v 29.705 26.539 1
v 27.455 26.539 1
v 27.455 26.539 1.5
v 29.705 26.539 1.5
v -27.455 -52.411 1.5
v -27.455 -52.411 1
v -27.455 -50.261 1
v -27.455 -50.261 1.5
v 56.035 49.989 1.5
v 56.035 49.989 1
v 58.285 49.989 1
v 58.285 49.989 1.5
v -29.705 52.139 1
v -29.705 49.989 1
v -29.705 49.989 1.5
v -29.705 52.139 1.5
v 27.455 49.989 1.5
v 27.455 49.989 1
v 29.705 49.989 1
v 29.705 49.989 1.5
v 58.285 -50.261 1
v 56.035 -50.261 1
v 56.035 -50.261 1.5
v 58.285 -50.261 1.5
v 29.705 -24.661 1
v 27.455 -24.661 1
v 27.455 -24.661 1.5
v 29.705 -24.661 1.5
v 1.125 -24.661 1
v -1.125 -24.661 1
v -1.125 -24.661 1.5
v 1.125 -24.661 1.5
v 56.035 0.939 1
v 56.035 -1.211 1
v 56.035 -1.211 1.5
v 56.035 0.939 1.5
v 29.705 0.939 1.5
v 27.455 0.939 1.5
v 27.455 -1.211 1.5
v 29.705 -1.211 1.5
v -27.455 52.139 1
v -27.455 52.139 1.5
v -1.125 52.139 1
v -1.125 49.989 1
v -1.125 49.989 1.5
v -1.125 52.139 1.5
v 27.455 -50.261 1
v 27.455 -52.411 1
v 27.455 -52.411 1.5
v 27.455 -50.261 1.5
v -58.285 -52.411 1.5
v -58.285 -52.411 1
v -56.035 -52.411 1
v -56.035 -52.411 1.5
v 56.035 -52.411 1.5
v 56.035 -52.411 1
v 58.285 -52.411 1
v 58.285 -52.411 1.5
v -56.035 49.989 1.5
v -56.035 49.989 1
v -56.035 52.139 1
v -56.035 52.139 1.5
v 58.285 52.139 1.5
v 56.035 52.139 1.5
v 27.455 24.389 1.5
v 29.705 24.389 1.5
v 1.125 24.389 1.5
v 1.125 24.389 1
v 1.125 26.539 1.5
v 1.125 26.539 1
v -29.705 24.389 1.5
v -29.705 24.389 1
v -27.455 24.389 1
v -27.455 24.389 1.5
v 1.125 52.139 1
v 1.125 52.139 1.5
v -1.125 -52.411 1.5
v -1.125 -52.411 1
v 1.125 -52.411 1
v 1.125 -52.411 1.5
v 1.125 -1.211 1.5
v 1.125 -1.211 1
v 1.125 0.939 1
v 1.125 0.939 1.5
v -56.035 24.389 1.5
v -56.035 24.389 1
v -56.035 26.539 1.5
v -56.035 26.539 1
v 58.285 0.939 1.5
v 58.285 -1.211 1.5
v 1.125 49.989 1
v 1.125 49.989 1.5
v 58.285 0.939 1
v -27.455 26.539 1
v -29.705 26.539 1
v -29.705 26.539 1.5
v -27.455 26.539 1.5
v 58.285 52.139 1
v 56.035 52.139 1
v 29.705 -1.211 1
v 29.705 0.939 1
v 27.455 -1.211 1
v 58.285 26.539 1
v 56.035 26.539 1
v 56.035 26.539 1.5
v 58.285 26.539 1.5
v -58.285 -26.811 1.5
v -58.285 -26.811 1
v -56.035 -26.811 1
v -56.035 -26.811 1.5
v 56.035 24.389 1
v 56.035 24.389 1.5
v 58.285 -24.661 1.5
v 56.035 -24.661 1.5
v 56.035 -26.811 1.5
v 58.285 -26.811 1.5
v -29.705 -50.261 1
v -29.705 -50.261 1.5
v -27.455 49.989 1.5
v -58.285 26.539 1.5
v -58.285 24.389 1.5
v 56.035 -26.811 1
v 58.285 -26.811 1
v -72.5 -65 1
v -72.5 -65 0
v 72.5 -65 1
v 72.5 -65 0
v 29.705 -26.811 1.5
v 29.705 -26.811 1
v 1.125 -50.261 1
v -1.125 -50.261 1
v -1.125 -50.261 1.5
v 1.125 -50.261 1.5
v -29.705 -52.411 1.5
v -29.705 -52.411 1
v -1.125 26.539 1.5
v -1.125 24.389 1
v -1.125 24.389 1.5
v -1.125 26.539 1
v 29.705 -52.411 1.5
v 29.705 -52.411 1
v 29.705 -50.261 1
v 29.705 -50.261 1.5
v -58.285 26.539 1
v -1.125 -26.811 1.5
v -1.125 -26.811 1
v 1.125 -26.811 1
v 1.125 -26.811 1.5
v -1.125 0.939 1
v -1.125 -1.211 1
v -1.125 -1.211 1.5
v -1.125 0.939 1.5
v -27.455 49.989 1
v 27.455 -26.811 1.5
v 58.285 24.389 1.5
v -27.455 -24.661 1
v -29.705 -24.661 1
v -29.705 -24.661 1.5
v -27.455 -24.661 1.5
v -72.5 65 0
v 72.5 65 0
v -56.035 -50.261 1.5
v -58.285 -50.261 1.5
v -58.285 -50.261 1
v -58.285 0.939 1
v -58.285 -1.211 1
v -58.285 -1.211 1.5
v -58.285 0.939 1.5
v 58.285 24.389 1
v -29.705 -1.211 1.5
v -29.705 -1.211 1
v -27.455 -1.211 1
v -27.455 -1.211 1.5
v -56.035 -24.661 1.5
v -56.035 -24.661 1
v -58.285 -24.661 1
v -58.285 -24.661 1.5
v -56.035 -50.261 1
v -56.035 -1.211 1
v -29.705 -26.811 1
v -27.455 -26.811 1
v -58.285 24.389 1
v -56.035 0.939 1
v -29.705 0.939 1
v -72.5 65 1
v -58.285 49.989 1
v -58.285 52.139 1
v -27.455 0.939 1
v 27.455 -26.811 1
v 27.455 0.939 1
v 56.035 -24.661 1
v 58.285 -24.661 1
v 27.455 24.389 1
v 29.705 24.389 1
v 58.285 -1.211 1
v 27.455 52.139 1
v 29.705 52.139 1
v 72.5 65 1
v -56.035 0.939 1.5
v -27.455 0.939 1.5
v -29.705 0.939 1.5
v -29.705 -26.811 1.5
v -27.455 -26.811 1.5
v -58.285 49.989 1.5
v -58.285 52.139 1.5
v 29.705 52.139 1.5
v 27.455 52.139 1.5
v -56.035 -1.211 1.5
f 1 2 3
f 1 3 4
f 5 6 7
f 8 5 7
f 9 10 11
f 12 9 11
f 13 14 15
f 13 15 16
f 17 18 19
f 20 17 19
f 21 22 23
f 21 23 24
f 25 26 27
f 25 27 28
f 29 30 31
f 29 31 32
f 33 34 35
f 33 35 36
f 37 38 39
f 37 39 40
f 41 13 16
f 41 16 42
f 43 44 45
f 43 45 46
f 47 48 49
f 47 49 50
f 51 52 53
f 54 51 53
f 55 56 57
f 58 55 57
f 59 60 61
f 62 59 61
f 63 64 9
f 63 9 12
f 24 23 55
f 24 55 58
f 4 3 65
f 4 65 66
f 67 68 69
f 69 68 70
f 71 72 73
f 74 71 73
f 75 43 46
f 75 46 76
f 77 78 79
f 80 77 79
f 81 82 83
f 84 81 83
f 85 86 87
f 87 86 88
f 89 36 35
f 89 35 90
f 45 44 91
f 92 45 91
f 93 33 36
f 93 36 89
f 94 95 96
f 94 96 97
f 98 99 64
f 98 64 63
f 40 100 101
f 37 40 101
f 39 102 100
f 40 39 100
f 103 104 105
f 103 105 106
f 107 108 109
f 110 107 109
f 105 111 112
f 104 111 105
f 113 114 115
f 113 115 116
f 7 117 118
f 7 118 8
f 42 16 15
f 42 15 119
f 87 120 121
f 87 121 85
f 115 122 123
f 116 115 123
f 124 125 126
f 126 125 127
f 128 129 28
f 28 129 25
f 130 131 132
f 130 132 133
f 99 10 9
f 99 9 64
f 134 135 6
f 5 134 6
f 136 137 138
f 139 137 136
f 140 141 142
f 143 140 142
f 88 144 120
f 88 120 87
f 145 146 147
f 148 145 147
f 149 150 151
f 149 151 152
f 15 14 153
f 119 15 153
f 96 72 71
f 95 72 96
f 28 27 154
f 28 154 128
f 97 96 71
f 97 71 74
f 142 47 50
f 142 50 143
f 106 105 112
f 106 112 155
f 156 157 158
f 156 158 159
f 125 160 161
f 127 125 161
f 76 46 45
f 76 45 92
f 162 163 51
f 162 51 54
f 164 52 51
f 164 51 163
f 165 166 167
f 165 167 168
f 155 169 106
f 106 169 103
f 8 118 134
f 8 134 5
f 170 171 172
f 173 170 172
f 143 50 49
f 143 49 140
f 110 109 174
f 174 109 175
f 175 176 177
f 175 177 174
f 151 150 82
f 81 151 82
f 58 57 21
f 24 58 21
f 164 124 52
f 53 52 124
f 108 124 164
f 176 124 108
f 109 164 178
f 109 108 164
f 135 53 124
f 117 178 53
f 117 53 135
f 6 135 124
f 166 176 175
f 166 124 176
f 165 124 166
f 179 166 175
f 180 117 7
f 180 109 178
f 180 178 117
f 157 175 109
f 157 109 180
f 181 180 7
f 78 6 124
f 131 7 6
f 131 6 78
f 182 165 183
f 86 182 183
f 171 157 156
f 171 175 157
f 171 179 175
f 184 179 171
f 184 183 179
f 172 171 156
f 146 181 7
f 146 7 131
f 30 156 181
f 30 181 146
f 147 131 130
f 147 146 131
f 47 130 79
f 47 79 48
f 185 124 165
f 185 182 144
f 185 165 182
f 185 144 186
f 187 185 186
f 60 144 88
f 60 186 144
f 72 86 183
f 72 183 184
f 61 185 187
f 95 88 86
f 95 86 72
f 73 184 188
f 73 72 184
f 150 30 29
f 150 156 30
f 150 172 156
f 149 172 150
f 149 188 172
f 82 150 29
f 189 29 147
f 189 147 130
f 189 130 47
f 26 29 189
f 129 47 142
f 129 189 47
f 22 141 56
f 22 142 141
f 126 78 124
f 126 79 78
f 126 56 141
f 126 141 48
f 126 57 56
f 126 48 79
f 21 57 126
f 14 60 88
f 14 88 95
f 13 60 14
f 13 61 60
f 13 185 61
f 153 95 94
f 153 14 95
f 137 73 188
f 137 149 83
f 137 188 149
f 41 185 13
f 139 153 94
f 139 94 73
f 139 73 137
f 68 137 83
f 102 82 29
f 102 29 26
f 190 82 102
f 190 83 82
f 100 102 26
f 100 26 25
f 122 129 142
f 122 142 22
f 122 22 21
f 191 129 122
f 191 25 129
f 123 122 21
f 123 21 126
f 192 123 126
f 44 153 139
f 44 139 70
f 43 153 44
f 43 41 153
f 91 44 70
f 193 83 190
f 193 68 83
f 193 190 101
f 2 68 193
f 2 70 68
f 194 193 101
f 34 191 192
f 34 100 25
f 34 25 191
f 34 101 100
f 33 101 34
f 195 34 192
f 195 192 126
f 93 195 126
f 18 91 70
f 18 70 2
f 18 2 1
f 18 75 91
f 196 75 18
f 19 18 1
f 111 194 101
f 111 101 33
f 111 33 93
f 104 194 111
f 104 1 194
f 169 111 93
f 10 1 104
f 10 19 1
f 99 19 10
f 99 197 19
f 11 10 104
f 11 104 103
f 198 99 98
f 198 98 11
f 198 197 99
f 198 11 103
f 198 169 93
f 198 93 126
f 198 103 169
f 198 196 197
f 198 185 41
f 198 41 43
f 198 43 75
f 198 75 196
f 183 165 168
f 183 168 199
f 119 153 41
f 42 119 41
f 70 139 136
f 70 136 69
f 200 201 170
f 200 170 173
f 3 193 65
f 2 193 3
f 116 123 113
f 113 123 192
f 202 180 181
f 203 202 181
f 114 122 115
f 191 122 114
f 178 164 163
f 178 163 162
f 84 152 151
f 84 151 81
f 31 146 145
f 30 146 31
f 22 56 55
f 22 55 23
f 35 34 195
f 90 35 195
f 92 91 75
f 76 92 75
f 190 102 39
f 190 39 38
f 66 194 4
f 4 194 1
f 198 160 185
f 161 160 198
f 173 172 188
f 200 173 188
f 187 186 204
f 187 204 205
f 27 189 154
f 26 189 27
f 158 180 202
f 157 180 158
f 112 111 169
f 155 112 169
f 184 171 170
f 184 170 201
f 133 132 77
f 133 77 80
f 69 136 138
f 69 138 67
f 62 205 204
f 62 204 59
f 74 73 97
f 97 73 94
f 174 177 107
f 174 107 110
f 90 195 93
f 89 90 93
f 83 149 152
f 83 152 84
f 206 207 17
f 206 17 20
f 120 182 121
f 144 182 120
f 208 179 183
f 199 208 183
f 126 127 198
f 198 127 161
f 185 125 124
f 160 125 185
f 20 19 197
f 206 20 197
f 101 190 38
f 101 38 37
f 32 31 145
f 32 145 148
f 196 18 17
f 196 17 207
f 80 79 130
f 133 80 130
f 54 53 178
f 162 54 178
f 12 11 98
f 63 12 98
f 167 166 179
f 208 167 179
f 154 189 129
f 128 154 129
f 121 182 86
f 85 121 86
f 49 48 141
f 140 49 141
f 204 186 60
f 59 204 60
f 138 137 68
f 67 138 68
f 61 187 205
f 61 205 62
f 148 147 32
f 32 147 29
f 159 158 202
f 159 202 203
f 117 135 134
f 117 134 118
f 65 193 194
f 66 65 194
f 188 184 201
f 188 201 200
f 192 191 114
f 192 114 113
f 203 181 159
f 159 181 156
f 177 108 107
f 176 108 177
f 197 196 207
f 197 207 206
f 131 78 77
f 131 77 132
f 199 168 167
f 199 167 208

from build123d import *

# Parameters (mm, degrees)
SKETCH_1_W      = 145
SKETCH_1_H      = 130
EXTRUDE_1_DEPTH = 1
SKETCH_2_W      = 2.25
SKETCH_2_H      = 2.15
EXTRUDE_2_DEPTH = 0.5


with BuildPart() as part:
    # 草图1 → 凸台-拉伸1 (new body)
    with BuildSketch(Plane.XY):
        Rectangle(SKETCH_1_W, SKETCH_1_H)
    extrude(amount=EXTRUDE_1_DEPTH)

    # 草图2 → 凸台-拉伸2 (add)
    with BuildSketch(Plane.XY.offset(1)):
        with Locations((-28.58, 51.063510548)):
            Rectangle(SKETCH_2_W, SKETCH_2_H)
        with Locations((-57.16, 51.063510548)):
            Rectangle(SKETCH_2_W, SKETCH_2_H)
        with Locations((0, 51.063510548)):
            Rectangle(SKETCH_2_W, SKETCH_2_H)
        with Locations((28.58, 51.063510548)):
            Rectangle(SKETCH_2_W, SKETCH_2_H)
        with Locations((57.16, 51.063510548)):
            Rectangle(SKETCH_2_W, SKETCH_2_H)
        with Locations((-28.58, 25.463510548)):
            Rectangle(SKETCH_2_W, SKETCH_2_H)
        with Locations((0, 25.463510548)):
            Rectangle(SKETCH_2_W, SKETCH_2_H)
        with Locations((28.58, 25.463510548)):
            Rectangle(SKETCH_2_W, SKETCH_2_H)
        with Locations((57.16, 25.463510548)):
            Rectangle(SKETCH_2_W, SKETCH_2_H)
        with Locations((-28.58, -0.136489452)):
            Rectangle(SKETCH_2_W, SKETCH_2_H)
        with Locations((0, -0.136489452)):
            Rectangle(SKETCH_2_W, SKETCH_2_H)
        with Locations((28.58, -0.136489452)):
            Rectangle(SKETCH_2_W, SKETCH_2_H)
        with Locations((57.16, -0.136489452)):
            Rectangle(SKETCH_2_W, SKETCH_2_H)
        with Locations((-28.58, -25.736489452)):
            Rectangle(SKETCH_2_W, SKETCH_2_H)
        with Locations((0, -25.736489452)):
            Rectangle(SKETCH_2_W, SKETCH_2_H)
        with Locations((28.58, -25.736489452)):
            Rectangle(SKETCH_2_W, SKETCH_2_H)
        with Locations((57.16, -25.736489452)):
            Rectangle(SKETCH_2_W, SKETCH_2_H)
        with Locations((-28.58, -51.336489452)):
            Rectangle(SKETCH_2_W, SKETCH_2_H)
        with Locations((0, -51.336489452)):
            Rectangle(SKETCH_2_W, SKETCH_2_H)
        with Locations((28.58, -51.336489452)):
            Rectangle(SKETCH_2_W, SKETCH_2_H)
        with Locations((57.16, -51.336489452)):
            Rectangle(SKETCH_2_W, SKETCH_2_H)
        with Locations((-57.16, 25.463510548)):
            Rectangle(SKETCH_2_W, SKETCH_2_H)
        with Locations((-57.16, -0.136489452)):
            Rectangle(SKETCH_2_W, SKETCH_2_H)
        with Locations((-57.16, -25.736489452)):
            Rectangle(SKETCH_2_W, SKETCH_2_H)
        with Locations((-57.16, -51.336489452)):
            Rectangle(SKETCH_2_W, SKETCH_2_H)
    extrude(amount=EXTRUDE_2_DEPTH)


solid = part.part
